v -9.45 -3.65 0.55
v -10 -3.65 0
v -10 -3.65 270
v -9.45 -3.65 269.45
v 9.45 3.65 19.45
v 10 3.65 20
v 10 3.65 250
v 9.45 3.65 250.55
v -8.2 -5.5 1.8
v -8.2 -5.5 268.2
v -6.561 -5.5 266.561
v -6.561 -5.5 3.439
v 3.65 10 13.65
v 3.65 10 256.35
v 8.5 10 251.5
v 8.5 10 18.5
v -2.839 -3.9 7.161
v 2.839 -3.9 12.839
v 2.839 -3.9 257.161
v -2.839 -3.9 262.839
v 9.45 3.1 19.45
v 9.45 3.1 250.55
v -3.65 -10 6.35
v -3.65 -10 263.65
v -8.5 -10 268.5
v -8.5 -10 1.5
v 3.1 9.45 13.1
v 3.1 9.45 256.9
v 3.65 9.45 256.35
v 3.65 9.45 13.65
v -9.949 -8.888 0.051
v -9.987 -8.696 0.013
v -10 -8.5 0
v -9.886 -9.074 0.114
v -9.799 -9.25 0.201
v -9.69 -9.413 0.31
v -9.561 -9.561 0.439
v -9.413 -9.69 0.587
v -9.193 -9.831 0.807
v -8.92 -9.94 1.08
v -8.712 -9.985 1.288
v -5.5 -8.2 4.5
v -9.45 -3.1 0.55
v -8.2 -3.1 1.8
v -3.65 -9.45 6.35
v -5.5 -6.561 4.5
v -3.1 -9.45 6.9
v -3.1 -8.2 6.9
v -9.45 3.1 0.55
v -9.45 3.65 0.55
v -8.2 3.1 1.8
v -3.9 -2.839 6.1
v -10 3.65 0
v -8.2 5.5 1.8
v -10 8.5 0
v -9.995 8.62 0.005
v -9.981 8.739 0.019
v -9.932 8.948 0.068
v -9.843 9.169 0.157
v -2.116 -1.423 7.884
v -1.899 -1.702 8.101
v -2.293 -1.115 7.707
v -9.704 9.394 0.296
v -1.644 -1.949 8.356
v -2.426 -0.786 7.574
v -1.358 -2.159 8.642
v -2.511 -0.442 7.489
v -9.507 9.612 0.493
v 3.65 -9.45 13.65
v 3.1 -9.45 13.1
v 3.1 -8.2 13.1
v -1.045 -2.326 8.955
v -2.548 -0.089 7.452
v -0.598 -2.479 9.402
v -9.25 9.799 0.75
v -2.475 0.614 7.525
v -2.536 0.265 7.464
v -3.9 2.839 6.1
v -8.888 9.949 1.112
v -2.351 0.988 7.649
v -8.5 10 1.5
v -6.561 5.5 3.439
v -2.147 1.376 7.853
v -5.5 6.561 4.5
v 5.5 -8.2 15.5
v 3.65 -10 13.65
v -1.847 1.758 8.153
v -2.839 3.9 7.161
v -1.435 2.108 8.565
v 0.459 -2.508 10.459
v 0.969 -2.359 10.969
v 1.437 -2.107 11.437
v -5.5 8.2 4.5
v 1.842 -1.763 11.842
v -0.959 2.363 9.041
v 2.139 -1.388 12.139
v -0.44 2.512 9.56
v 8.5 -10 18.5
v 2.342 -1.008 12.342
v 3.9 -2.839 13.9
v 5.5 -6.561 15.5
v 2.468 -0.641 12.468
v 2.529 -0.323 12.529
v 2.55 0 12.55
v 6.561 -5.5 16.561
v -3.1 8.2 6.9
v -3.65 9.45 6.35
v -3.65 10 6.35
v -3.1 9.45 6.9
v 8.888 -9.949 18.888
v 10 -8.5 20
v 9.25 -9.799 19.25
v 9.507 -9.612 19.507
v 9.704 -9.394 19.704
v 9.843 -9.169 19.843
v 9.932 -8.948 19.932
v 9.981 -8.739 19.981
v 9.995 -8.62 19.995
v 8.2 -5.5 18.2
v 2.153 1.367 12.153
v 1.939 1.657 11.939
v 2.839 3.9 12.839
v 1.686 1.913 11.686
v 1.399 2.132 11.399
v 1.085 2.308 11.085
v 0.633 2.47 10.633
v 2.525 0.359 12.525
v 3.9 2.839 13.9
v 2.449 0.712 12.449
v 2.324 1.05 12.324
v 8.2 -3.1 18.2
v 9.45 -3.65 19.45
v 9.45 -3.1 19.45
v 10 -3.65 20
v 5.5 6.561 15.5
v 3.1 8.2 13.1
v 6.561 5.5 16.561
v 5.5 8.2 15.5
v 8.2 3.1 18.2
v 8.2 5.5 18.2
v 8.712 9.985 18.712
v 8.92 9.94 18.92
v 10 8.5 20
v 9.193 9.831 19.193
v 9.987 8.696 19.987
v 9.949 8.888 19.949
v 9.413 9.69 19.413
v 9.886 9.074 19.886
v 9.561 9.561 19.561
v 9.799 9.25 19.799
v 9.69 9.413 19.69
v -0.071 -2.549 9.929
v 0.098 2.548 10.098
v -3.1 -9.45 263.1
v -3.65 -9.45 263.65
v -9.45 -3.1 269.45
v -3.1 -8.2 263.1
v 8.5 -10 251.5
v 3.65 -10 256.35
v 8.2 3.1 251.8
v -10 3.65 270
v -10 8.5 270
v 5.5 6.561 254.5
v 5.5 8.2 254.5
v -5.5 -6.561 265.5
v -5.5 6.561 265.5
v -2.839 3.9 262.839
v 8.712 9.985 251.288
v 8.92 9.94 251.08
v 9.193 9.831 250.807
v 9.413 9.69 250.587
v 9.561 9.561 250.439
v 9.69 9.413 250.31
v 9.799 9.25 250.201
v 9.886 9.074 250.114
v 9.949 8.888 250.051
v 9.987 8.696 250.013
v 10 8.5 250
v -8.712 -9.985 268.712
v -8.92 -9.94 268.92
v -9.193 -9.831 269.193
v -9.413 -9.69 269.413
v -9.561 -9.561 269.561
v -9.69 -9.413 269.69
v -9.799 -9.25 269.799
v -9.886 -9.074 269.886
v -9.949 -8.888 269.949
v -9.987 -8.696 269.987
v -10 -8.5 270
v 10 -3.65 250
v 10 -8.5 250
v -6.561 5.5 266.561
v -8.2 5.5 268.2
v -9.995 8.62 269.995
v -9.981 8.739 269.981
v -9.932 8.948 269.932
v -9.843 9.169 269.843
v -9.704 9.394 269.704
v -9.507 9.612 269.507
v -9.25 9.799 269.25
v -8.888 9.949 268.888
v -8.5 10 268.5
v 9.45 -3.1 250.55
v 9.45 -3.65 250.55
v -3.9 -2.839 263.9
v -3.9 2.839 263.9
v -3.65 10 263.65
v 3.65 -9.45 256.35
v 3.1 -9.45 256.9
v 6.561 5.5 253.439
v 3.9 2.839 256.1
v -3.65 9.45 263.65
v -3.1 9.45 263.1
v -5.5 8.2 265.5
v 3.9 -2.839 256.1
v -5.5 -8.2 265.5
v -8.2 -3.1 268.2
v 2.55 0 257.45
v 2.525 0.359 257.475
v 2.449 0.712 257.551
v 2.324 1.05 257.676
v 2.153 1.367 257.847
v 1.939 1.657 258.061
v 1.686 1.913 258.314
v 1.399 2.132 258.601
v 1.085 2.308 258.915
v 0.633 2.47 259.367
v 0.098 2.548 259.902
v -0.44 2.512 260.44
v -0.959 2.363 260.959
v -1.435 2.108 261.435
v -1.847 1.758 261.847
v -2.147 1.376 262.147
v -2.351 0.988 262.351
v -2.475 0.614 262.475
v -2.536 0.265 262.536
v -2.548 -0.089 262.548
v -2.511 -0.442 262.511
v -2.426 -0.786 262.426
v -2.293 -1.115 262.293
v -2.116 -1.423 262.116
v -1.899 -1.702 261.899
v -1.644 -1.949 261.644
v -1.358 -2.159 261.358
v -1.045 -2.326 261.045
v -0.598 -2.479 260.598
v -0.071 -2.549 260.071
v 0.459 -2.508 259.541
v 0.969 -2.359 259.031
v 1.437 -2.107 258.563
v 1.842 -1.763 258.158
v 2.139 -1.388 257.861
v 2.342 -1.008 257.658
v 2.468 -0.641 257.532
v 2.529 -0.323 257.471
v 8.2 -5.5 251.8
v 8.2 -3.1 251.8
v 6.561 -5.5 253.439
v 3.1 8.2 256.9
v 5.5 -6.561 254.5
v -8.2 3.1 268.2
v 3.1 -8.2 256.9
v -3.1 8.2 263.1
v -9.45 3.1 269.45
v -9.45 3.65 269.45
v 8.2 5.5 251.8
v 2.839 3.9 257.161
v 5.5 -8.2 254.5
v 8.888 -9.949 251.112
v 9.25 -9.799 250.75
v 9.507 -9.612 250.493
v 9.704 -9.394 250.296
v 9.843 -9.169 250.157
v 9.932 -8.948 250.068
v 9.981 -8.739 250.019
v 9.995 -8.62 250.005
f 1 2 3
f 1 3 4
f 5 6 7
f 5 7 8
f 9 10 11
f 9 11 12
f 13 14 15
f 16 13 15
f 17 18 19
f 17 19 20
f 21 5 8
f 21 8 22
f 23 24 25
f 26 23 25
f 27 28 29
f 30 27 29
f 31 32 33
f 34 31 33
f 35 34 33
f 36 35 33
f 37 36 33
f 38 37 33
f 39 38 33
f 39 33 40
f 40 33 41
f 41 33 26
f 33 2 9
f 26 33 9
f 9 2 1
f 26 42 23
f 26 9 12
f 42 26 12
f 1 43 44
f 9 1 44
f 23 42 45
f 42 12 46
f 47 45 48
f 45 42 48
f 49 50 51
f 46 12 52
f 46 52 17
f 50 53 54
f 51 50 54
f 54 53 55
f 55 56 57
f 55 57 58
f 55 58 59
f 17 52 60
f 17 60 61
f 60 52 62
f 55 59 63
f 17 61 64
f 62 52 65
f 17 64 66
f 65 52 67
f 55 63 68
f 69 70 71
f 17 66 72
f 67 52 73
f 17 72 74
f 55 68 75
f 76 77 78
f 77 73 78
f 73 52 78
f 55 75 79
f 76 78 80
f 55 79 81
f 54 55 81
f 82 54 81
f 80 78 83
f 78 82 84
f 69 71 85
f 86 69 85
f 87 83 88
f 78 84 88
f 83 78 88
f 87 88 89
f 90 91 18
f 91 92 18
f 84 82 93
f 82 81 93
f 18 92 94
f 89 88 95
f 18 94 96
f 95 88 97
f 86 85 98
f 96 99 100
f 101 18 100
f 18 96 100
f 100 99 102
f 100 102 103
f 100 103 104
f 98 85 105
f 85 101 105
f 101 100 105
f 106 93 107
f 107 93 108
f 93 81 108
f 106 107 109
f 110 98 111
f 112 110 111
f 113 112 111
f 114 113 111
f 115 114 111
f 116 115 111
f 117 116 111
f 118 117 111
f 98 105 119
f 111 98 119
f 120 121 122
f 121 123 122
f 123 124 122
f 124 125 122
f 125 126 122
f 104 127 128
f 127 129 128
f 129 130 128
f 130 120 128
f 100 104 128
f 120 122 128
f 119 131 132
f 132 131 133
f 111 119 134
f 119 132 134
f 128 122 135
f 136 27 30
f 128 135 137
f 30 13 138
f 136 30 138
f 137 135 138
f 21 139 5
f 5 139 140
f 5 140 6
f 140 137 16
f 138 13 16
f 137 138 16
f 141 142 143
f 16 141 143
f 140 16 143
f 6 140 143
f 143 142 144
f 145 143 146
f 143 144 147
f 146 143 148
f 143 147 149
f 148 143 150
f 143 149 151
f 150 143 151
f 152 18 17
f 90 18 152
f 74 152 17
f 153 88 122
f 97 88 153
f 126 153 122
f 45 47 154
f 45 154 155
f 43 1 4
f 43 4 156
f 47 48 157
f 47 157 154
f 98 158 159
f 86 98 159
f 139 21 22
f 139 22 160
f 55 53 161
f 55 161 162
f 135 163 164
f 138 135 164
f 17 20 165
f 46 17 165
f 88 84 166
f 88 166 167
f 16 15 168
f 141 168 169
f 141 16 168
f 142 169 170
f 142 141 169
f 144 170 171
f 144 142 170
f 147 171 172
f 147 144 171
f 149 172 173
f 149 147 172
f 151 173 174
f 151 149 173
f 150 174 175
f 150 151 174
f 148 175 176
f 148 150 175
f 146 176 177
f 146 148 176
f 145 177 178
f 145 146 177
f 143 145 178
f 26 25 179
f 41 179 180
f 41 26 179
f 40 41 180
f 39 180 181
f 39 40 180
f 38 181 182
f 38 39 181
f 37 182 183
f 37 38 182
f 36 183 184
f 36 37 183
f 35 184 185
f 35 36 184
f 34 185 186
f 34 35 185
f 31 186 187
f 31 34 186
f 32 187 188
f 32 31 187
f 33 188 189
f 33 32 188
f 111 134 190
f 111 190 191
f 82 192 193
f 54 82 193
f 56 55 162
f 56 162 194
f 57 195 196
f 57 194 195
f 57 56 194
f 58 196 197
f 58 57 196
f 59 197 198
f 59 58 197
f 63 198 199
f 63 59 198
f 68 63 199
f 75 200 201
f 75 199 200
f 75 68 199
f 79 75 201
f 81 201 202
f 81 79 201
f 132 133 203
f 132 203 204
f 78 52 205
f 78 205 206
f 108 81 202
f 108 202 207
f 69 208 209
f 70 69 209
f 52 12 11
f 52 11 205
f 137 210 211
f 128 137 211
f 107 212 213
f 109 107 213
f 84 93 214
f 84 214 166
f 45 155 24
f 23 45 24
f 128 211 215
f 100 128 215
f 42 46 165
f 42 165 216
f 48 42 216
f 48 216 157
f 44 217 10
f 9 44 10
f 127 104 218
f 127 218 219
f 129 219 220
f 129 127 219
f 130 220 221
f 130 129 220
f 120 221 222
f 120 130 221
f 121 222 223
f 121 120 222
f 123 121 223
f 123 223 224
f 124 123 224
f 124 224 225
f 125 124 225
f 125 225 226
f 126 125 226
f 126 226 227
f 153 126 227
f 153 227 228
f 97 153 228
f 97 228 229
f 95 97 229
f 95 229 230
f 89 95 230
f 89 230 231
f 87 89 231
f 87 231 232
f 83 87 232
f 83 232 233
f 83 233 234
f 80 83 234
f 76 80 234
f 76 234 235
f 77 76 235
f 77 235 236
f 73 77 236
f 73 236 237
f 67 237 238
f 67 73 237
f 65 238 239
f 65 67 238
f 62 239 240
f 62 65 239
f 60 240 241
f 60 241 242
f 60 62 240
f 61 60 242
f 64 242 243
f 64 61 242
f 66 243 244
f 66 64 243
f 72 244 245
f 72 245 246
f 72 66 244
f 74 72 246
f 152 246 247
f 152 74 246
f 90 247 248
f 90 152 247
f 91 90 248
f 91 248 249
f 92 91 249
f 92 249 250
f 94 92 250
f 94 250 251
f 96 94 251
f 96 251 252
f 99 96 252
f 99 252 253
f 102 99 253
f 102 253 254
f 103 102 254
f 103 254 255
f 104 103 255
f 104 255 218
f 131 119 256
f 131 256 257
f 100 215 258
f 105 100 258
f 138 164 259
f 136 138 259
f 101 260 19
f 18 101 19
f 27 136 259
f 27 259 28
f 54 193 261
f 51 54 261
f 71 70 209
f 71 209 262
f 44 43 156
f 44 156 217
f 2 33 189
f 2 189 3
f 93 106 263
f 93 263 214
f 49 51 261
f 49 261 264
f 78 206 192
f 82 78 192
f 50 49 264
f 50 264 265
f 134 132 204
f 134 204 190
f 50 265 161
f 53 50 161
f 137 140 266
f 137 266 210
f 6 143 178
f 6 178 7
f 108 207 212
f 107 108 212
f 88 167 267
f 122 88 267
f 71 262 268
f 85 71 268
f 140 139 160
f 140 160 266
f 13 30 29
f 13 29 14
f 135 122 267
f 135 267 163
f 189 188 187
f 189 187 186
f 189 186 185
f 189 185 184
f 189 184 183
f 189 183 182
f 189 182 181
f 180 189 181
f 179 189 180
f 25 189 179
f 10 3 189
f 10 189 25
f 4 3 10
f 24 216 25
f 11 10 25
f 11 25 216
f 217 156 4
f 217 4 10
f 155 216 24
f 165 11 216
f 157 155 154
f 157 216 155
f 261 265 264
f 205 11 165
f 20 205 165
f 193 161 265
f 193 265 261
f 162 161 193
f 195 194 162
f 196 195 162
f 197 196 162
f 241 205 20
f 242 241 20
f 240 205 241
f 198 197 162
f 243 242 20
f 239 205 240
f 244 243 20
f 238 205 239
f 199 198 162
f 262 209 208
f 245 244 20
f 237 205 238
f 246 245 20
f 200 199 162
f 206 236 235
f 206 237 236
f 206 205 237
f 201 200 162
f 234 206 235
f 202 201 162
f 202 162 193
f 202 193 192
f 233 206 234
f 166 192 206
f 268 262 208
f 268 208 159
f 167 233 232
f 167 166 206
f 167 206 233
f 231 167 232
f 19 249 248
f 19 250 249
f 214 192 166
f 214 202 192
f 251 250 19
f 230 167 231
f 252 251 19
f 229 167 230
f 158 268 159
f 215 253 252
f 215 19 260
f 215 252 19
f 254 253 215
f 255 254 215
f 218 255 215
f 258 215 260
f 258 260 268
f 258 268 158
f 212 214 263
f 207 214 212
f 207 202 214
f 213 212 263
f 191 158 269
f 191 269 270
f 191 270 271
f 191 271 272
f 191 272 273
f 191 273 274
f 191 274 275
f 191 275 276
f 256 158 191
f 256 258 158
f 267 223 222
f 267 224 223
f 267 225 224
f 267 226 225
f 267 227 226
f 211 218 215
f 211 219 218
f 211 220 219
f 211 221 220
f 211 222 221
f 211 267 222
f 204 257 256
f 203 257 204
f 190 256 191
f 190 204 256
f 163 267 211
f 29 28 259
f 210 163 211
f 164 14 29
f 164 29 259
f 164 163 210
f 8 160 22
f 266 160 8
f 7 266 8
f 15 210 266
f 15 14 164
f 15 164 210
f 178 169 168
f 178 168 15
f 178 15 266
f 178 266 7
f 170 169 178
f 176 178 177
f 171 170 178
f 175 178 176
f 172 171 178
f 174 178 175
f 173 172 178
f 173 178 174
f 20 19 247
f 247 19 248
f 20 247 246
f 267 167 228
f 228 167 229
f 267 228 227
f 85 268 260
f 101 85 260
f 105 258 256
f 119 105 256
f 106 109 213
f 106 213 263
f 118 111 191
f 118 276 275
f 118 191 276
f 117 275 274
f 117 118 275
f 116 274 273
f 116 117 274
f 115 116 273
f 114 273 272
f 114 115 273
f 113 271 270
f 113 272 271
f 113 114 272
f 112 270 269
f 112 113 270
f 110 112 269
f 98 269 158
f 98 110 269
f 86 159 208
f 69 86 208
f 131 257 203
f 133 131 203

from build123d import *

# Parameters (mm, degrees)
SKETCH_2_R          = 2.55
EXTRUDE_1_DEPTH     = 270
CUT_EXTRUDE_1_DEPTH = 38


with BuildPart() as part:
    # 草图2 → 凸台-拉伸1 (new body)
    with BuildSketch(Plane.XY):
        with BuildLine():
            Line((-3.9, 2.839339828), (-6.560660172, 5.5))
            Line((-6.560660172, 5.5), (-8.2, 5.5))
            Line((-8.2, 5.5), (-8.2, 3.1))
            Line((-8.2, 3.1), (-9.45, 3.1))
            Line((-9.45, 3.1), (-9.45, 3.65))
            Line((-9.45, 3.65), (-10, 3.65))
            Line((-10, 3.65), (-10, 8.5))
            ThreePointArc((-10, 8.5), (-9.560660172, 9.560660172), (-8.5, 10))
            Line((-8.5, 10), (-3.65, 10))
            Line((-3.65, 10), (-3.65, 9.45))
            Line((-3.65, 9.45), (-3.1, 9.45))
            Line((-3.1, 9.45), (-3.1, 8.2))
            Line((-3.1, 8.2), (-5.5, 8.2))
            Line((-5.5, 8.2), (-5.5, 6.560660172))
            Line((-5.5, 6.560660172), (-2.839339828, 3.9))
            Line((-2.839339828, 3.9), (2.839339828, 3.9))
            Line((2.839339828, 3.9), (5.5, 6.560660172))
            Line((5.5, 6.560660172), (5.5, 8.2))
            Line((5.5, 8.2), (3.1, 8.2))
            Line((3.1, 8.2), (3.1, 9.45))
            Line((3.1, 9.45), (3.65, 9.45))
            Line((3.65, 9.45), (3.65, 10))
            Line((3.65, 10), (8.5, 10))
            ThreePointArc((8.5, 10), (9.560660172, 9.560660172), (10, 8.5))
            Line((10, 8.5), (10, 3.65))
            Line((10, 3.65), (9.45, 3.65))
            Line((9.45, 3.65), (9.45, 3.1))
            Line((9.45, 3.1), (8.2, 3.1))
            Line((8.2, 3.1), (8.2, 5.5))
            Line((8.2, 5.5), (6.560660172, 5.5))
            Line((6.560660172, 5.5), (3.9, 2.839339828))
            Line((3.9, 2.839339828), (3.9, -2.839339828))
            Line((3.9, -2.839339828), (6.560660172, -5.5))
            Line((6.560660172, -5.5), (8.2, -5.5))
            Line((8.2, -5.5), (8.2, -3.1))
            Line((8.2, -3.1), (9.45, -3.1))
            Line((9.45, -3.1), (9.45, -3.65))
            Line((9.45, -3.65), (10, -3.65))
            Line((10, -3.65), (10, -8.5))
            ThreePointArc((10, -8.5), (9.560660172, -9.560660172), (8.5, -10))
            Line((8.5, -10), (3.65, -10))
            Line((3.65, -10), (3.65, -9.45))
            Line((3.65, -9.45), (3.1, -9.45))
            Line((3.1, -9.45), (3.1, -8.2))
            Line((3.1, -8.2), (5.5, -8.2))
            Line((5.5, -8.2), (5.5, -6.560660172))
            Line((5.5, -6.560660172), (2.839339828, -3.9))
            Line((2.839339828, -3.9), (-2.839339828, -3.9))
            Line((-2.839339828, -3.9), (-5.5, -6.560660172))
            Line((-5.5, -6.560660172), (-5.5, -8.2))
            Line((-5.5, -8.2), (-3.1, -8.2))
            Line((-3.1, -8.2), (-3.1, -9.45))
            Line((-3.1, -9.45), (-3.65, -9.45))
            Line((-3.65, -9.45), (-3.65, -10))
            Line((-3.65, -10), (-8.5, -10))
            ThreePointArc((-8.5, -10), (-9.560660172, -9.560660172), (-10, -8.5))
            Line((-10, -8.5), (-10, -3.65))
            Line((-10, -3.65), (-9.45, -3.65))
            Line((-9.45, -3.65), (-9.45, -3.1))
            Line((-9.45, -3.1), (-8.2, -3.1))
            Line((-8.2, -3.1), (-8.2, -5.5))
            Line((-8.2, -5.5), (-6.560660172, -5.5))
            Line((-6.560660172, -5.5), (-3.9, -2.839339828))
            Line((-3.9, -2.839339828), (-3.9, 2.839339828))
        make_face()
        Circle(SKETCH_2_R, mode=Mode.SUBTRACT)
    extrude(amount=EXTRUDE_1_DEPTH)

    # 草图3 → 切除-拉伸1 (cut)
    with BuildSketch(Plane(origin=(0, 10, 0), x_dir=(1, 0, 0), z_dir=(0, 1, 0))):
        Polygon((-10, 0), (10, -20), (10, 0), align=None)
        Polygon((-10, -270), (10, -250), (10, -270), align=None)
    extrude(amount=-CUT_EXTRUDE_1_DEPTH, mode=Mode.SUBTRACT)


solid = part.part
